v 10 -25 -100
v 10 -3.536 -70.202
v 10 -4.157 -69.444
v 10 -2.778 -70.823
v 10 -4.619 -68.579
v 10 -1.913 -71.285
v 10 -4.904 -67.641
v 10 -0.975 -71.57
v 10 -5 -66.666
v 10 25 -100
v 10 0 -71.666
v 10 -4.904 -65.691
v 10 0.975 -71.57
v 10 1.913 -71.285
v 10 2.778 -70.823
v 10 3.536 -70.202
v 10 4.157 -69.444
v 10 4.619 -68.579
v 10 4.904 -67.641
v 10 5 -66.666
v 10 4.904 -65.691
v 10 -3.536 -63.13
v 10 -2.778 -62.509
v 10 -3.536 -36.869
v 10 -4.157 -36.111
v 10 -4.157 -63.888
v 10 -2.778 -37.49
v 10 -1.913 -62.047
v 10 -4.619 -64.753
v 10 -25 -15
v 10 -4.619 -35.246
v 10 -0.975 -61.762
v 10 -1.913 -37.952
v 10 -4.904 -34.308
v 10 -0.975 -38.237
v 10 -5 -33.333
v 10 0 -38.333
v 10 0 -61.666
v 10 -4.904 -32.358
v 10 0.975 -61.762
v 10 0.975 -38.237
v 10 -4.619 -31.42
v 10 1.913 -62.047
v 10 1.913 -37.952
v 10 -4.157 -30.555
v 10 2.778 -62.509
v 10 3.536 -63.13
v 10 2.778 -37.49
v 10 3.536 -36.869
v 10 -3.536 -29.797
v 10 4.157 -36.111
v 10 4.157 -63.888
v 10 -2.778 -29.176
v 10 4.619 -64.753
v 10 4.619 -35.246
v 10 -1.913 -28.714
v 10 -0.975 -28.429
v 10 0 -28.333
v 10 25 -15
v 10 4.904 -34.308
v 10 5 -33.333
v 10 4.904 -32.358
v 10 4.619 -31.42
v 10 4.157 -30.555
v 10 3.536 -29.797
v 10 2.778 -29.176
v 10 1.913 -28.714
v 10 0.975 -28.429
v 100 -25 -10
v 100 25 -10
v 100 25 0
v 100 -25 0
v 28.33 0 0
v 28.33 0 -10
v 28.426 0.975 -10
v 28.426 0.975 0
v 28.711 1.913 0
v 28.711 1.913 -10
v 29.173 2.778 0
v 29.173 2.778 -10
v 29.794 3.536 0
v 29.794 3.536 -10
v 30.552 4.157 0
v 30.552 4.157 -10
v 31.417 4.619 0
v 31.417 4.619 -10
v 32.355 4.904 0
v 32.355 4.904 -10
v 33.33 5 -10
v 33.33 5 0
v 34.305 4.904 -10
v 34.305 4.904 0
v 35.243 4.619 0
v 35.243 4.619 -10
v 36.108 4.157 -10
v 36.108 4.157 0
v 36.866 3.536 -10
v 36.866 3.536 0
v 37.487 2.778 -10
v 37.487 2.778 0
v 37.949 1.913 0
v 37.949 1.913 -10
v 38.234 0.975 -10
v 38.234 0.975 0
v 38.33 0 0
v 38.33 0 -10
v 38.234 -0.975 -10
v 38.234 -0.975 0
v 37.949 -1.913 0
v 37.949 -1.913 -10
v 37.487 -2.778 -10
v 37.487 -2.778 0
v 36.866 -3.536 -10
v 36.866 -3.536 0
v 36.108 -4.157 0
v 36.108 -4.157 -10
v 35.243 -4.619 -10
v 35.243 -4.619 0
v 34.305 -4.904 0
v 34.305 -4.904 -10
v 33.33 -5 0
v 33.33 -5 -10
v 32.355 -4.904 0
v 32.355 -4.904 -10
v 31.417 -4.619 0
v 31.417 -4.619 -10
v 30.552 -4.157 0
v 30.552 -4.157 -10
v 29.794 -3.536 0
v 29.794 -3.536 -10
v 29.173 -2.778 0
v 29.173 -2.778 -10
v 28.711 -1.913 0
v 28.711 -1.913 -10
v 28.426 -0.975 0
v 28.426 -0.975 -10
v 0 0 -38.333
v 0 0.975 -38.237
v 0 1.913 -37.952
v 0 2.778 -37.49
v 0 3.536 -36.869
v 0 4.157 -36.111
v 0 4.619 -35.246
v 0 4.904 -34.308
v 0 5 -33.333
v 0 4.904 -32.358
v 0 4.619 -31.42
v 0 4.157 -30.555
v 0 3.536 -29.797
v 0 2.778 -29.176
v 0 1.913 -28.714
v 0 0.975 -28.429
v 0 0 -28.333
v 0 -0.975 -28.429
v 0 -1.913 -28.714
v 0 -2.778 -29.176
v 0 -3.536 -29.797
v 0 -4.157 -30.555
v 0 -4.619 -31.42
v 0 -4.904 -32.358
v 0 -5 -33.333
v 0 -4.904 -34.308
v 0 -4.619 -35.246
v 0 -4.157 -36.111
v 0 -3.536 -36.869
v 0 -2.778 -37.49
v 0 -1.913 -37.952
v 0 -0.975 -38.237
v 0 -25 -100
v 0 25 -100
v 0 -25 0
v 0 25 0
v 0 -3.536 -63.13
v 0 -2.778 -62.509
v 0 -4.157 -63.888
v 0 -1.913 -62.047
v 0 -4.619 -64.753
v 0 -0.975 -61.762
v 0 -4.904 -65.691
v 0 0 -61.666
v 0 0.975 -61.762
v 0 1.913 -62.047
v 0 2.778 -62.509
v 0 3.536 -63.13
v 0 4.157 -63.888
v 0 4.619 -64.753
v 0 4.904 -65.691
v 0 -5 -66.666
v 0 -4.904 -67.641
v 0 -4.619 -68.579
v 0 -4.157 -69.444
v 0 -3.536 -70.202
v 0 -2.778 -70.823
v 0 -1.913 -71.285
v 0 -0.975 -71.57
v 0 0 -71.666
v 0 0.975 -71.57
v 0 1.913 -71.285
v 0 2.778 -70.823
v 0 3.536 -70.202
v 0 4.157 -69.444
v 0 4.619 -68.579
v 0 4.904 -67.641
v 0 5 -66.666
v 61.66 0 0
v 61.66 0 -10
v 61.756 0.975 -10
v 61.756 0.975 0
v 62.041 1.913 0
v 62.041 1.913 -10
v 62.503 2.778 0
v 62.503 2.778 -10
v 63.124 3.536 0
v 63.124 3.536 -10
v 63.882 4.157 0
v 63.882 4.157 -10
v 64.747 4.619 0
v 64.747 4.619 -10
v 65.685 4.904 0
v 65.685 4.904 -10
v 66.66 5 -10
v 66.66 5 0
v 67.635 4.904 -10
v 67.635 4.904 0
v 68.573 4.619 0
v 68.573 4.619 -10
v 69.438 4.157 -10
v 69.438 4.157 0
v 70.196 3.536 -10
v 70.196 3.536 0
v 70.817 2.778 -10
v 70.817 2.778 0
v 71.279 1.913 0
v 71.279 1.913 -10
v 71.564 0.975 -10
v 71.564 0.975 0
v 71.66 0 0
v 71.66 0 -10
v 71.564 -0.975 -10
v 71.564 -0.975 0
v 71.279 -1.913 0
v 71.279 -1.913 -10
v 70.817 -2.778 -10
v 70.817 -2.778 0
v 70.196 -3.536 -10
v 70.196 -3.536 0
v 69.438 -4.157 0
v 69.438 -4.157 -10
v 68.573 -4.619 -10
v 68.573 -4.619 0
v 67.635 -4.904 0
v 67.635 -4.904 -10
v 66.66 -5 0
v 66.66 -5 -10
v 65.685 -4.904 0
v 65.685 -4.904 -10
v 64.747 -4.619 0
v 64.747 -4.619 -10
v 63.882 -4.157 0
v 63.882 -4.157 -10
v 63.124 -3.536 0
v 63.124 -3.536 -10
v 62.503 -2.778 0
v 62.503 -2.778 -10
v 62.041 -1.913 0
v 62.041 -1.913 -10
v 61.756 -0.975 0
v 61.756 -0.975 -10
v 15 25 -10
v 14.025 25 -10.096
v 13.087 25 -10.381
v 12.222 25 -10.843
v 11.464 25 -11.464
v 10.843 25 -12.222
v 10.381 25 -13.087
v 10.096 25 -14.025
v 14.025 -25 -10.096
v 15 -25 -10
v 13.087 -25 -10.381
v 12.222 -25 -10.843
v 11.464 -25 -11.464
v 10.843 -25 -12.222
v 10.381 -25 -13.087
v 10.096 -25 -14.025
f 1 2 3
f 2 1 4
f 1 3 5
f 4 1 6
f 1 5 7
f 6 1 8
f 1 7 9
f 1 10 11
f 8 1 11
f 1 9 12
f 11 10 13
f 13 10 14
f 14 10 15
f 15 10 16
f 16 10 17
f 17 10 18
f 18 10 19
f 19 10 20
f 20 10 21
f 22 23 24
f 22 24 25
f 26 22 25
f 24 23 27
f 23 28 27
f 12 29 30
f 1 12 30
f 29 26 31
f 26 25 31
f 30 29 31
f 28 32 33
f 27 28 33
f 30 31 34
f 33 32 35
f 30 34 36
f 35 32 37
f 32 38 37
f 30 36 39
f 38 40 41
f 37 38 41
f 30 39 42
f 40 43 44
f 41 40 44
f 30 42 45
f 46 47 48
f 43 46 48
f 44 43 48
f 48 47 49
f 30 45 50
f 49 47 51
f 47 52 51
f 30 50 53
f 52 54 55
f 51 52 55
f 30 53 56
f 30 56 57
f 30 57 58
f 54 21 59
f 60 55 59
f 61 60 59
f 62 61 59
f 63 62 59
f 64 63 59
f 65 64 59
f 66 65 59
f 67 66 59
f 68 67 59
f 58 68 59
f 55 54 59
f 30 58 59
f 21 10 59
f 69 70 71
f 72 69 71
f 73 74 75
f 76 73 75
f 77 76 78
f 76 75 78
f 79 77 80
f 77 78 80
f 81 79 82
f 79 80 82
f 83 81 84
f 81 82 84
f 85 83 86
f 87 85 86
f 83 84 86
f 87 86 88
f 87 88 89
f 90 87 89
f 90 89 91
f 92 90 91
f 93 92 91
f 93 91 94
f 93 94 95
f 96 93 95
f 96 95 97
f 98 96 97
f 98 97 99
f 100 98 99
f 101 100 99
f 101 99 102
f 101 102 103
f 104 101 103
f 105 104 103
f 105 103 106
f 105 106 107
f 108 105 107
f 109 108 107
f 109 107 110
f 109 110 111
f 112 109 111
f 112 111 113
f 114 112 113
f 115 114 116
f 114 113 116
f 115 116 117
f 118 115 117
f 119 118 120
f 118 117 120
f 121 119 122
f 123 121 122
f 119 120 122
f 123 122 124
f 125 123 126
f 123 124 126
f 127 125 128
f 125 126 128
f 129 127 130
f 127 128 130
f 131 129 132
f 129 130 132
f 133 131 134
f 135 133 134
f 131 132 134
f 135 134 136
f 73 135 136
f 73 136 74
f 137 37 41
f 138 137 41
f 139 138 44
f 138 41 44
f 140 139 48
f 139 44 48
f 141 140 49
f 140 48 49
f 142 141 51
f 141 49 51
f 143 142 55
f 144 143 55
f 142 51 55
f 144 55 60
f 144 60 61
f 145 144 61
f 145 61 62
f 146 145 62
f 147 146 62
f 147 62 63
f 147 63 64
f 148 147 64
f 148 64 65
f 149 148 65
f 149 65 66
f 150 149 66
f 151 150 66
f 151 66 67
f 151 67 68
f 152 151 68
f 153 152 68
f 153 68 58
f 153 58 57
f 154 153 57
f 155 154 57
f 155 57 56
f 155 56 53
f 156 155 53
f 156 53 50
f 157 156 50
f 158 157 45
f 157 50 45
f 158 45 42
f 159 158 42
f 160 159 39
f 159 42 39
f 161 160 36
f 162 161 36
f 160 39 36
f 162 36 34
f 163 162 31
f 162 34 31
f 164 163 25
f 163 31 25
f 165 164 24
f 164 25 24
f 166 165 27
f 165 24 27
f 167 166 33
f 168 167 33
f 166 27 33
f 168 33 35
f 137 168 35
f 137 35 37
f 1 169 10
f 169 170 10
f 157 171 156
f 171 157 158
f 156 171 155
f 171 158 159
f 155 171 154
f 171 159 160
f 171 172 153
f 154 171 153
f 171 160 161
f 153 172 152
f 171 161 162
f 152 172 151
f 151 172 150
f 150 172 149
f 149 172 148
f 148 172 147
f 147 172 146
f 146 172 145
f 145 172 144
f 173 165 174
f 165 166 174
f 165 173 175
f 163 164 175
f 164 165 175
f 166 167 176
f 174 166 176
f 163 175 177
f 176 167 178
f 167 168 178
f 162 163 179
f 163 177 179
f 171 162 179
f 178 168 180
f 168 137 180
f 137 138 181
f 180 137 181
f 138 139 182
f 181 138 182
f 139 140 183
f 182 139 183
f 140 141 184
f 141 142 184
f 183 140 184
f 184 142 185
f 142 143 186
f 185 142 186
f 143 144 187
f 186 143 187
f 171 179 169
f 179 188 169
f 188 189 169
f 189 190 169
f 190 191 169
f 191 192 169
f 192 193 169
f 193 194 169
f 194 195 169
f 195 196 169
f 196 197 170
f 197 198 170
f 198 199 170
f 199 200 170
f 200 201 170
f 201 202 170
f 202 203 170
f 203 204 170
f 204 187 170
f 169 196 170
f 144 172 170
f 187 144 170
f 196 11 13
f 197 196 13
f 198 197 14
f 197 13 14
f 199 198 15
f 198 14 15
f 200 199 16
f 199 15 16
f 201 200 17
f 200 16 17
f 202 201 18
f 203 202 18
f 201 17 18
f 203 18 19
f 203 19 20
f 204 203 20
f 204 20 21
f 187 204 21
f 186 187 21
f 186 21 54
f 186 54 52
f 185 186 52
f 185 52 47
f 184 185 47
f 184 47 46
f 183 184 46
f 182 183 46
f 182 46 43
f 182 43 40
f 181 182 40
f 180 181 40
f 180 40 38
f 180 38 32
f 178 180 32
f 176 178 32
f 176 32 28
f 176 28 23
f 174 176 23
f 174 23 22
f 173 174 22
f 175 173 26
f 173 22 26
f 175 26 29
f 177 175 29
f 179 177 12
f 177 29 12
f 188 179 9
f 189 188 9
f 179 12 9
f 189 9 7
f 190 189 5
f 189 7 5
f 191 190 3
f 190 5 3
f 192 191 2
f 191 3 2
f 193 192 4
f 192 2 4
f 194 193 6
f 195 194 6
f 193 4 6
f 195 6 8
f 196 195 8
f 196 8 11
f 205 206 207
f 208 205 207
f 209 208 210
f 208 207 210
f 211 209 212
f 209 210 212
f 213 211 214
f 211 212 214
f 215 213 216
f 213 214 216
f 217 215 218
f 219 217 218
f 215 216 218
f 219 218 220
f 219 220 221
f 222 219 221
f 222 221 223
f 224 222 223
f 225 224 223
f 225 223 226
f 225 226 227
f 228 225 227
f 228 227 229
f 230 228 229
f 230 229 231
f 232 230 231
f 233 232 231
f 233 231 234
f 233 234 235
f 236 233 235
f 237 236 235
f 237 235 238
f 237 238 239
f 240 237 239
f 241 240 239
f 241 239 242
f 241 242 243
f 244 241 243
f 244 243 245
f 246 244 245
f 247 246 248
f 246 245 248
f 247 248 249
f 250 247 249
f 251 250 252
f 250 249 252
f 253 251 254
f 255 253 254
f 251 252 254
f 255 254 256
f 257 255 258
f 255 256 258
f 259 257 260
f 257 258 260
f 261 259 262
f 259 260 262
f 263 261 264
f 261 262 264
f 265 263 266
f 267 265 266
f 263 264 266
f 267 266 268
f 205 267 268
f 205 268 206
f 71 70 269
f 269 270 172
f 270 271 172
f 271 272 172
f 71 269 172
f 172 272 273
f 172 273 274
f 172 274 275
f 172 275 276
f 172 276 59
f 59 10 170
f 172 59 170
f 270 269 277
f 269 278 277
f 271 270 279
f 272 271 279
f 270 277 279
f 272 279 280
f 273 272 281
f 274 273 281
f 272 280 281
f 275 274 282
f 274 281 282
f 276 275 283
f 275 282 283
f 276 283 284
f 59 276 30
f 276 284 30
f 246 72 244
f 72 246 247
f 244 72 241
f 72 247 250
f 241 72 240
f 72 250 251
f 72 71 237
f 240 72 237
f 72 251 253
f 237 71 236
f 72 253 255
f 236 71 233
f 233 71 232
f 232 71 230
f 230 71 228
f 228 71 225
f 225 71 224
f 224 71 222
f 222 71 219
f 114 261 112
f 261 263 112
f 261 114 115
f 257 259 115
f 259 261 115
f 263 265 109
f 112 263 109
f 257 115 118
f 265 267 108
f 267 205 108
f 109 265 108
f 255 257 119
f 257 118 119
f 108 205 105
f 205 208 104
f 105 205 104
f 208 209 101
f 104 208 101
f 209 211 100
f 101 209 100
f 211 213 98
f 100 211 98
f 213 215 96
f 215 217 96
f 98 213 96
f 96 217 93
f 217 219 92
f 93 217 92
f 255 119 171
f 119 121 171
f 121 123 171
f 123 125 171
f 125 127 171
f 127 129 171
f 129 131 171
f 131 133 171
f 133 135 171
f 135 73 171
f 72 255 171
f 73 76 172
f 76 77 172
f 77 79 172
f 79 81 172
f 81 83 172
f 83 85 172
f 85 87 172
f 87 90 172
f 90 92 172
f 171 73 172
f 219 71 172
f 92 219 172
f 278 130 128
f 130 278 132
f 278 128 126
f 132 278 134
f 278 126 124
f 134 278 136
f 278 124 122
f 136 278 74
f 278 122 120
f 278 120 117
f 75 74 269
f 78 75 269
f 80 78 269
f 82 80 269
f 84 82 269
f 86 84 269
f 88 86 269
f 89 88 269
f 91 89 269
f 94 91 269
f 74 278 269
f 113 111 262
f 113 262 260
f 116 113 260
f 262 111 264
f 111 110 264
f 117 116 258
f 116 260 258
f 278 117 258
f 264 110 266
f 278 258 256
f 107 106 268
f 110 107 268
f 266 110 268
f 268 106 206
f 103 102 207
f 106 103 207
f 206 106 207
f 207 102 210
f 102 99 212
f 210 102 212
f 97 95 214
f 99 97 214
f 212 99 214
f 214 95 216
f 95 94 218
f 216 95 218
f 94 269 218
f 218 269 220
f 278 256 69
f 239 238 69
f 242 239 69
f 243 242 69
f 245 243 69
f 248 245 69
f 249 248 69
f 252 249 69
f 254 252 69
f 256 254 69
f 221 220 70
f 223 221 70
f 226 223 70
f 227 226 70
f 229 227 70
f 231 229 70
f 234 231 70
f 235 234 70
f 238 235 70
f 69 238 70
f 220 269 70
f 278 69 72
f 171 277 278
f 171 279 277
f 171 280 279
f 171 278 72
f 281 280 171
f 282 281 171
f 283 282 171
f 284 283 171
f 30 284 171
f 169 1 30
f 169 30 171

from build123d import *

# Parameters (mm, degrees)
BOSS_EXTRUDE1_DEPTH = 25
FILLET1_R           = 5
SKETCH2_R           = 5
CUT_EXTRUDE1_DEPTH  = 137.839321834
SKETCH3_R           = 5
CUT_EXTRUDE2_DEPTH  = 137.839321834


with BuildPart() as part:
    # Sketch1 → Boss-Extrude1 (new, symmetric)
    with BuildSketch(Plane(origin=(0, 0, 0), x_dir=(1, 0, 0), z_dir=(0, 1, 0))):
        Polygon((0, 0), (0, 100), (10, 100), (10, 10), (100, 10), (100, 0), align=None)
    extrude(amount=BOSS_EXTRUDE1_DEPTH, both=True)

    # Fillet1
    fillet1_edges = [part.edges().sort_by_distance(p)[0] for p in [
        (10, 0, -10),
    ]]
    fillet(fillet1_edges, radius=FILLET1_R)

    # Sketch2 → Cut-Extrude1 (cut, through all)
    with BuildSketch(Plane(origin=(10, 0, 0), x_dir=(0, 0, -1), z_dir=(1, 0, 0))):
        with Locations((33.333, 0)):
            Circle(SKETCH2_R)
        with Locations((66.666, 0)):
            Circle(SKETCH2_R)
    extrude(amount=-CUT_EXTRUDE1_DEPTH, mode=Mode.SUBTRACT)

    # Sketch3 → Cut-Extrude2 (cut, through all)
    with BuildSketch(Plane(origin=(0, 0, -10), x_dir=(-1, 0, 0), z_dir=(0, 0, -1))):
        with Locations((-33.33, 0)):
            Circle(SKETCH3_R)
        with Locations((-66.66, 0)):
            Circle(SKETCH3_R)
    extrude(amount=-CUT_EXTRUDE2_DEPTH, mode=Mode.SUBTRACT)


solid = part.part
